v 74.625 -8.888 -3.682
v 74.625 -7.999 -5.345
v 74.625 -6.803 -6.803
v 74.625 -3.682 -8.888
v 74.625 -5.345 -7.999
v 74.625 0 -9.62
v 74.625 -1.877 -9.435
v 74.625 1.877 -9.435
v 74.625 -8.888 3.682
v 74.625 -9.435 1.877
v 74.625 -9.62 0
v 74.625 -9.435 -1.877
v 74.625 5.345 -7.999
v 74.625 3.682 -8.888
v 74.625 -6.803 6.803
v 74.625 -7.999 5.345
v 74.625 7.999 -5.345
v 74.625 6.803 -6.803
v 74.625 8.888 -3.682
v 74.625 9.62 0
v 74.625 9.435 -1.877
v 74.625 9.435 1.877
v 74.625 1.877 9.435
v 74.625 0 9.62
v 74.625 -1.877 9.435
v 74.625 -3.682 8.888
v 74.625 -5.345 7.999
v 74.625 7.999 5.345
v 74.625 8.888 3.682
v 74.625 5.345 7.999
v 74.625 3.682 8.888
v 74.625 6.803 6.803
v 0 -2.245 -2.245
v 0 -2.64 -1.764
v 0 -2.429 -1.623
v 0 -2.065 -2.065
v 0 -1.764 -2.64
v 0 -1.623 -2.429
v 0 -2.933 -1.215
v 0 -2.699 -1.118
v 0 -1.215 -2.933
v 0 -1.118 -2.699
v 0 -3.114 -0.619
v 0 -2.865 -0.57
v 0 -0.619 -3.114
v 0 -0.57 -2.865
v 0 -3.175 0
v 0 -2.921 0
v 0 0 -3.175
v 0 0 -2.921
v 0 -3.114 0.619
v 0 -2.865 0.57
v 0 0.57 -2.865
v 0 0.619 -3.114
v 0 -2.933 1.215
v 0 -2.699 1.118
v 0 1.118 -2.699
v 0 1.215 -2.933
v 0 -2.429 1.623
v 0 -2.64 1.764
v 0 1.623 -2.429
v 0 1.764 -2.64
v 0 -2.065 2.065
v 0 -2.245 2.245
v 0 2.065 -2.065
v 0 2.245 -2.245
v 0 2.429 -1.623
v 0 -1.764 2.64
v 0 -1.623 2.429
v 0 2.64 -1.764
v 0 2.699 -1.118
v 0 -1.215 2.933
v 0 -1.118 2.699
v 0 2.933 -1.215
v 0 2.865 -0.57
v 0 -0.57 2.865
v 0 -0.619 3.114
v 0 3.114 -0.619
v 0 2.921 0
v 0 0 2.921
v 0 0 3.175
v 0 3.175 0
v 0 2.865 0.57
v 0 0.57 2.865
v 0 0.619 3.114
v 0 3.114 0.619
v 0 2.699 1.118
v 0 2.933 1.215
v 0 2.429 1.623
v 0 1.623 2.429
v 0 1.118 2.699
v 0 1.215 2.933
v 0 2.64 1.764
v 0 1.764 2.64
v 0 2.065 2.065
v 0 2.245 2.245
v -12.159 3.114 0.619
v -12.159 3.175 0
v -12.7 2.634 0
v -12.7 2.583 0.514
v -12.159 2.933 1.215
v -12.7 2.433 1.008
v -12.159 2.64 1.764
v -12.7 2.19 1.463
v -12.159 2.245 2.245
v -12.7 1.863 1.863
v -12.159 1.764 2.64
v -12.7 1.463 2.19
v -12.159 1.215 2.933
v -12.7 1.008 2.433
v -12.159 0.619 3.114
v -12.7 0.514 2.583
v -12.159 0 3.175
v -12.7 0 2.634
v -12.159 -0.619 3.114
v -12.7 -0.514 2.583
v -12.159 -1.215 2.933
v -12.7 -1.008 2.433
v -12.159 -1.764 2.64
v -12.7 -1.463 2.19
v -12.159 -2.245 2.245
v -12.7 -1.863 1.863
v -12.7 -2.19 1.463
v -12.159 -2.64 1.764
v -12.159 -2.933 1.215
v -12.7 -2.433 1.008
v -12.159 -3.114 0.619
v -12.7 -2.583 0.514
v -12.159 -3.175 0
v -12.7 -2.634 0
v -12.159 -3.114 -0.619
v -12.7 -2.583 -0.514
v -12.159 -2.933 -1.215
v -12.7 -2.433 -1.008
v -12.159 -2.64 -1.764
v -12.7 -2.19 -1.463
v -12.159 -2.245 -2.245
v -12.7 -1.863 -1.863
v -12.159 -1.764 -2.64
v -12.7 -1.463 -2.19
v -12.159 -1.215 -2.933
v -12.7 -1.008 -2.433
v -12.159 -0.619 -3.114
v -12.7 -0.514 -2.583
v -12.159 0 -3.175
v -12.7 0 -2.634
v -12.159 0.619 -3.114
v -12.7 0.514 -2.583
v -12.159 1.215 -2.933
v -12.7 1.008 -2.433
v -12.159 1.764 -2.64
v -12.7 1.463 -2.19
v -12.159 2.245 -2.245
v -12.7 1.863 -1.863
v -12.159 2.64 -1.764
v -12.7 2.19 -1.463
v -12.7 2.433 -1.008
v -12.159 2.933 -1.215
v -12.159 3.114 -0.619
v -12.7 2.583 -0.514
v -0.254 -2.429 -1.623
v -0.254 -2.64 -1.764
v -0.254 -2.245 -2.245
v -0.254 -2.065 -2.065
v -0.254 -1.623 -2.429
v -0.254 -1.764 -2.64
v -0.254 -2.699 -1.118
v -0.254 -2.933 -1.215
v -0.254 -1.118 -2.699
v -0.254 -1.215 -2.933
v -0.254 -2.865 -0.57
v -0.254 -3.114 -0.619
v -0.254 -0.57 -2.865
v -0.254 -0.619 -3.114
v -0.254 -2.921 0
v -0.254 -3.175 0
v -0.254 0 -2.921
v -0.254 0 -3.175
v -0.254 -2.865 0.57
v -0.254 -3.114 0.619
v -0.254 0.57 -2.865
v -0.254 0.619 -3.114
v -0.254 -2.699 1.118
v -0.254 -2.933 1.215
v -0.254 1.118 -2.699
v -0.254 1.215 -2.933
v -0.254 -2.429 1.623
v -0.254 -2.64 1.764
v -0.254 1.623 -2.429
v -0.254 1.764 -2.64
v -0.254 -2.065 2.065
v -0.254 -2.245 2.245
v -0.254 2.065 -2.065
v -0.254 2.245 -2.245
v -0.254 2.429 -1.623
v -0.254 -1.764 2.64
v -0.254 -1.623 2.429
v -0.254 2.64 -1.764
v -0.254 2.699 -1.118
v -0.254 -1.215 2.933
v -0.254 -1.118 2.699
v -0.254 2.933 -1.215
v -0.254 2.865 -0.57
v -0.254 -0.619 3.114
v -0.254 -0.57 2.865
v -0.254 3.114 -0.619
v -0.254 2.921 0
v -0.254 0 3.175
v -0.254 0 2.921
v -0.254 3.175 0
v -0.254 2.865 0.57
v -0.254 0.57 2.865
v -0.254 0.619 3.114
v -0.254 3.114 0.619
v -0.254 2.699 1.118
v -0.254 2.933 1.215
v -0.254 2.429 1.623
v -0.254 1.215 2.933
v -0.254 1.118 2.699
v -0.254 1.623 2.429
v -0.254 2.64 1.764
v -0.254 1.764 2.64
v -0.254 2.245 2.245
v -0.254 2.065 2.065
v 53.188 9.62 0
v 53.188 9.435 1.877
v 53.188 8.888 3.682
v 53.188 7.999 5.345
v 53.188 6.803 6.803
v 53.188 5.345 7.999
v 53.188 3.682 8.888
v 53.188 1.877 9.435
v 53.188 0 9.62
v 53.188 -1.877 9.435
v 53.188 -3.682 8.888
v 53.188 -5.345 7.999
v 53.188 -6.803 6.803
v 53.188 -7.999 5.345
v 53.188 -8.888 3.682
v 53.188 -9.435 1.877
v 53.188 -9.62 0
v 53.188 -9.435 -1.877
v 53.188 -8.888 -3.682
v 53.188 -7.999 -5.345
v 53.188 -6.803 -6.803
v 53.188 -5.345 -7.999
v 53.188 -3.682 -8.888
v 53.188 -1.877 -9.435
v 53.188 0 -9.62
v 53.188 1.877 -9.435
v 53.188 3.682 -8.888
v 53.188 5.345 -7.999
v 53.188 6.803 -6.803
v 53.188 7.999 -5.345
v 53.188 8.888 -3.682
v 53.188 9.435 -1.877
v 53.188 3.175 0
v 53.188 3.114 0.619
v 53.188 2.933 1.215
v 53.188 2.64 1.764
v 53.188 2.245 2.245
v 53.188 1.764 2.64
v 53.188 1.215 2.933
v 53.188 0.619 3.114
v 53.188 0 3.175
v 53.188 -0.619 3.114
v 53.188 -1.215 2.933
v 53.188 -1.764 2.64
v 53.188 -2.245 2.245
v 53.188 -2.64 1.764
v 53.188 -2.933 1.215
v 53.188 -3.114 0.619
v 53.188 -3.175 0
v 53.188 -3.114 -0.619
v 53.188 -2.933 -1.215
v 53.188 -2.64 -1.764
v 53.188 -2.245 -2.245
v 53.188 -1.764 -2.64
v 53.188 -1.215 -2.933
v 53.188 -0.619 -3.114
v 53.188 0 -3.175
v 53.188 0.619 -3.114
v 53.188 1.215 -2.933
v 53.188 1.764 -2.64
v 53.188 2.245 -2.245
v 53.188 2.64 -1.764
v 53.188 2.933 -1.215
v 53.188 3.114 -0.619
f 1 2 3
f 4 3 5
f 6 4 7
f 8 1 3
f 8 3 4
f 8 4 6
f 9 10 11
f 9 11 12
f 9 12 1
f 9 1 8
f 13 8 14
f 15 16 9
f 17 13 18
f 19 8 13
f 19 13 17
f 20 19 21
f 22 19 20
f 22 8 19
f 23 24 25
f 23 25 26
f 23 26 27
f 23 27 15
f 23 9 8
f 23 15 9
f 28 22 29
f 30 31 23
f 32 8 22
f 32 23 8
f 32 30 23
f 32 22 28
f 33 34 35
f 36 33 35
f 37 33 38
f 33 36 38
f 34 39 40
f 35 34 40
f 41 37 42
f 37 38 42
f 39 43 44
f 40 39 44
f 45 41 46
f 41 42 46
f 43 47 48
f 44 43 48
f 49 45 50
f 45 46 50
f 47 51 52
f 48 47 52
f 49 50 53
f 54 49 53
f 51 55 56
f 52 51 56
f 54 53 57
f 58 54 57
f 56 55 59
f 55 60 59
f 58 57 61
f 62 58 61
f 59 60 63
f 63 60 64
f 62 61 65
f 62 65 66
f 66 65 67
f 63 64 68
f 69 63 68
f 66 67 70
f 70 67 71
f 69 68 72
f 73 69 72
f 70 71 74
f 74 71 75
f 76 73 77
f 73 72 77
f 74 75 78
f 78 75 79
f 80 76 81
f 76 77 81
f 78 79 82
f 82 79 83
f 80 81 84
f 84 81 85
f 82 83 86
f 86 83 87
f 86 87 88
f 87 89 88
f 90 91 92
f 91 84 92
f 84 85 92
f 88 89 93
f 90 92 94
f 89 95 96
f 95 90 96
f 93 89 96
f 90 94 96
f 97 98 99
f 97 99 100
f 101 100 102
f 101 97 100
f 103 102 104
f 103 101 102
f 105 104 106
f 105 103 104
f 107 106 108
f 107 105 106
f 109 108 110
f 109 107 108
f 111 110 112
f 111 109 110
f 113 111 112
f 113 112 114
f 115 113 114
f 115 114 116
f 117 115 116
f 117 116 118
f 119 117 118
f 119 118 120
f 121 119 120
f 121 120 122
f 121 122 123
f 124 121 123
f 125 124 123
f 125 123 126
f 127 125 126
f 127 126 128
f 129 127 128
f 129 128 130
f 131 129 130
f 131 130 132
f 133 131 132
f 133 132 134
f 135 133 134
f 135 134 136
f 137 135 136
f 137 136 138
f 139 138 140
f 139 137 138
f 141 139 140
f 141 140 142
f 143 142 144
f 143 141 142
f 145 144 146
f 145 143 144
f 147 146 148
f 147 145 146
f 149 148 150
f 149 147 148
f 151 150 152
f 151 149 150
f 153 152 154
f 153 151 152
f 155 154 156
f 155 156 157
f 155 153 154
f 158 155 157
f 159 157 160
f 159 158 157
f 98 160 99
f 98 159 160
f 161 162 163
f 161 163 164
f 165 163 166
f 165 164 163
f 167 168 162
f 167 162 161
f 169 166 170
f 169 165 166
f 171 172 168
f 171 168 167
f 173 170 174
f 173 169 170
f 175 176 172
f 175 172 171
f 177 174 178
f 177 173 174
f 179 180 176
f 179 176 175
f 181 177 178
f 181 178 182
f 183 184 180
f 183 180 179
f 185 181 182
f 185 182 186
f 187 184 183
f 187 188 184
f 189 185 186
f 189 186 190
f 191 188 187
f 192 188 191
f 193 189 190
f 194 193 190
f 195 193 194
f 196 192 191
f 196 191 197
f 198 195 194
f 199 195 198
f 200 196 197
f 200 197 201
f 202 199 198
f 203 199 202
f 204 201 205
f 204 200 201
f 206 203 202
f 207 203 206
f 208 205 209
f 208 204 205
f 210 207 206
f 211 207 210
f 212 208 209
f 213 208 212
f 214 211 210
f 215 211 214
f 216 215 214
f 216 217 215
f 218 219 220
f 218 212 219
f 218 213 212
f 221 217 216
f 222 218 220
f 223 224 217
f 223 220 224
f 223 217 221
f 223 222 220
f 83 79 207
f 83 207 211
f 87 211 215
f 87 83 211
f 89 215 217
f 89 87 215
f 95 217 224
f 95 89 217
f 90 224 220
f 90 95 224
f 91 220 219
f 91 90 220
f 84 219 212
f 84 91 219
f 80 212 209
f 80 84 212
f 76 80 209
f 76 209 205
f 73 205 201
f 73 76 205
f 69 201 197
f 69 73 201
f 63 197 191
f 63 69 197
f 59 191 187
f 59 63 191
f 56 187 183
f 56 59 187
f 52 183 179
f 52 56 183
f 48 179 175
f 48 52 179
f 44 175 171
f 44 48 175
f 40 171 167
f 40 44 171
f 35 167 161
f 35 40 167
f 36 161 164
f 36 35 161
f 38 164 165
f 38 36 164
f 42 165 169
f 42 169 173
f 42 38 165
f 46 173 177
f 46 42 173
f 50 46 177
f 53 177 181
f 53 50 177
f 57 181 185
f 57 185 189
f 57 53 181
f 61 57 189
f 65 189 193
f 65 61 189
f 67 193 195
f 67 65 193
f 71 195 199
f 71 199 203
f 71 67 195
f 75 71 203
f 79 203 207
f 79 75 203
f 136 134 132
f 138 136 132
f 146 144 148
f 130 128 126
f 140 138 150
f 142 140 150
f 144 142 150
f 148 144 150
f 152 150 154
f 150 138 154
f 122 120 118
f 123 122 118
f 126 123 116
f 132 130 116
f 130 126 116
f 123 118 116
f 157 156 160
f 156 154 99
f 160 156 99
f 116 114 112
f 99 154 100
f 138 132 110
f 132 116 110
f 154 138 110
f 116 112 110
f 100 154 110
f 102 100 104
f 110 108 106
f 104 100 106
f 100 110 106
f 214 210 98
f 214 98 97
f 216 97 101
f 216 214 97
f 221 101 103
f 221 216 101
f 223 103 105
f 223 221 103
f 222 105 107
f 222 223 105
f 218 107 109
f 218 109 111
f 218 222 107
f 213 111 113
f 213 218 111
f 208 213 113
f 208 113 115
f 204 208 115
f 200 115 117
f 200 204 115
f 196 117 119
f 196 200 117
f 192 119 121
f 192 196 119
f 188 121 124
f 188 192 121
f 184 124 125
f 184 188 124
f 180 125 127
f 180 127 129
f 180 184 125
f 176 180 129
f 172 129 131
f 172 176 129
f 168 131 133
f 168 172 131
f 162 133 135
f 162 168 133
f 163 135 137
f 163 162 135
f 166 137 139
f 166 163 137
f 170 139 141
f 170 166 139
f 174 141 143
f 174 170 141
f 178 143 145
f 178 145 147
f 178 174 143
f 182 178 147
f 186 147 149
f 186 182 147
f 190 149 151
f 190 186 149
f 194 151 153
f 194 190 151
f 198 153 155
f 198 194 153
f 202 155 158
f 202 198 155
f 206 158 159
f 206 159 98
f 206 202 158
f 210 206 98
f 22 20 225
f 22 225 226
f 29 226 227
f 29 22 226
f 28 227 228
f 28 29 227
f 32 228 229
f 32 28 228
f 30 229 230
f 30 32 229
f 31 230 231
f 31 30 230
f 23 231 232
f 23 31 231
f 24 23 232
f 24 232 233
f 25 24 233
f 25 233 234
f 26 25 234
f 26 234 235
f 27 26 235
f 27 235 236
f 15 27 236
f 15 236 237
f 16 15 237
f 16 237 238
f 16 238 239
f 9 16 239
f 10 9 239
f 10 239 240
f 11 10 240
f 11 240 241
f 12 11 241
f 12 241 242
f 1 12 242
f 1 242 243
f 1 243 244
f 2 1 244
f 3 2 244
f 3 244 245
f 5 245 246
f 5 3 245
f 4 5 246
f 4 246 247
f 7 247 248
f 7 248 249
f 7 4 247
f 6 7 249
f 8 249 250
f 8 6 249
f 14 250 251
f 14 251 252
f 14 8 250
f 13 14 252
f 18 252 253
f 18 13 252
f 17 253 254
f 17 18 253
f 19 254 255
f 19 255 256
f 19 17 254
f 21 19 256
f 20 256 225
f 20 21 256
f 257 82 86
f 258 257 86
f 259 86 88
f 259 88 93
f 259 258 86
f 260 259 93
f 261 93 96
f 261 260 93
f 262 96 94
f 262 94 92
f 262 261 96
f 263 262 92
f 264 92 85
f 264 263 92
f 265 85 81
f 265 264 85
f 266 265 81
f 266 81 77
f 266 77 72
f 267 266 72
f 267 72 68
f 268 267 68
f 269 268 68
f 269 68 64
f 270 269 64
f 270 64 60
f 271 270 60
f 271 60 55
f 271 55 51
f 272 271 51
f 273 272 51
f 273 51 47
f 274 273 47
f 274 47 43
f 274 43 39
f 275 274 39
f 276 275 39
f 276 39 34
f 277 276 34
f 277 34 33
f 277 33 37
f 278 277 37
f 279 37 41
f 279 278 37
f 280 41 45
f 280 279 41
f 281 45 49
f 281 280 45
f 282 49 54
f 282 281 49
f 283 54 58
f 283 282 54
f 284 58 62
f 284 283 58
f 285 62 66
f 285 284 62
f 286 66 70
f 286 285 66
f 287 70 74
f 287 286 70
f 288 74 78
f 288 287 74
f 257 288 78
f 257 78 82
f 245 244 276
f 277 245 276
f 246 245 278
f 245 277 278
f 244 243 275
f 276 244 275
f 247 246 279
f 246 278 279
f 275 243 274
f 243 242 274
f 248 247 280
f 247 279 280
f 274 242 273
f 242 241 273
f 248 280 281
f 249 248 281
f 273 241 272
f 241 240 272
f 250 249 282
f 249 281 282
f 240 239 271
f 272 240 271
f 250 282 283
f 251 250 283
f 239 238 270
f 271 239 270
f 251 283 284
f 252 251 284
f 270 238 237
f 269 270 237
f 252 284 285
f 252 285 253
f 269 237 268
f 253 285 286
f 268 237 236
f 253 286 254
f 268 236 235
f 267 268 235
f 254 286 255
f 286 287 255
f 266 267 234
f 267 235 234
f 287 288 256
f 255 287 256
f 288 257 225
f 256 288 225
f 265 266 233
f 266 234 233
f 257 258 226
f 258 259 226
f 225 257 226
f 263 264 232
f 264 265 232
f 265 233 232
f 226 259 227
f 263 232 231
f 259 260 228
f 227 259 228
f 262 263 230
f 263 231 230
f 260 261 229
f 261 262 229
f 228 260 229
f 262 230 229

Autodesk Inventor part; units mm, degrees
sketch "Sketch_1" plane through (0, 0, 0) normal (0, 0, 1) x (1, 0, 0)
  line L0 (74.6252, 0) -> (0, 0)
  line L1 (0, 0) -> (0, 3.175)
  line L2 (0, 3.175) -> (53.1876, 3.175)
  line L3 (53.1876, 3.175) -> (53.1876, 9.6203)
  line L4 (53.1876, 9.6203) -> (74.6252, 9.6203)
  line L5 (74.6252, 9.6203) -> (74.6252, 0)
  line L6 (74.6252, 0) -> (0, 0)
revolve "Revolution1" add sketch "Sketch_1" angle 360 about axis through (74.6252, 0, 0) along (1, 0, 0)
sketch "Sketch_3" plane through (0, 0, 0) normal (0, 0, 1) x (1, 0, 0)
  line L0 (0, 0) -> (-12.7, 0)
  line L1 (-12.7, 0) -> (-12.7, 2.634)
  line L2 (-12.7, 2.634) -> (-12.159, 3.175)
  line L3 (-12.159, 3.175) -> (0, 3.175)
  line L4 (0, 3.175) -> (0, 0)
  line L5 (0, 0) -> (-12.7, 0)
revolve "Revolution2" add sketch "Sketch_3" angle 360 about axis through (0, 0, 0) along (1, 0, 0)
sketch "Sketch_30" plane through (0, 0, 0) normal (0, 0, 1) x (1, 0, 0)
  line L0 (0, 0) -> (-0.254, 0)
  line L1 (-0.254, 3.429) -> (-0.254, 2.921)
  line L2 (-0.254, 2.921) -> (0, 2.921)
  line L3 (0, 2.921) -> (0, 3.429)
  line L4 (0, 3.429) -> (-0.254, 3.429)
revolve "Revolution3" cut sketch "Sketch_30" angle 360 about axis through (0, 0, 0) along (1, 0, 0)
ref_plane "dia1_XY" through (0, 3.175, 0) normal (1, 0, 0) x (0, 0, -1)
ref_plane "dia1_YZ" through (0, 3.175, 0) normal (0, 0, -1) x (0, 1, 0)
ref_plane "dia1_ZX" through (0, 3.175, 0) normal (0, 1, 0) x (1, 0, 0)
ref_plane "dia12_XY" through (0, 0, 10.9537) normal (1, 0, 0) x (0, 0, -1)
ref_plane "dia12_YZ" through (0, 0, 10.9537) normal (0, 0, -1) x (0, 1, 0)
ref_plane "dia12_ZX" through (0, 0, 10.9537) normal (0, 1, 0) x (1, 0, 0)
ref_plane "dia2_XY" through (0, -3.175, 0) normal (1, 0, 0) x (0, 0, -1)
ref_plane "dia2_YZ" through (0, -3.175, 0) normal (0, 0, -1) x (0, 1, 0)
ref_plane "dia2_ZX" through (0, -3.175, 0) normal (0, 1, 0) x (1, 0, 0)
ref_plane "dia22_XY" through (0, 0, -10.9537) normal (1, 0, 0) x (0, 0, -1)
ref_plane "dia22_YZ" through (0, 0, -10.9537) normal (0, 0, -1) x (0, 1, 0)
ref_plane "dia22_ZX" through (0, 0, -10.9537) normal (0, 1, 0) x (1, 0, 0)
ref_plane "rl1_XY" through (-12.7, 0, 0) normal (1, 0, 0) x (0, 0, -1)
ref_plane "rl1_YZ" through (-12.7, 0, 0) normal (0, 0, -1) x (0, 1, 0)
ref_plane "rl1_ZX" through (-12.7, 0, 0) normal (0, 1, 0) x (1, 0, 0)
ref_plane "rl2_XY" through (0, 0, 0) normal (1, 0, 0) x (0, 0, -1)
ref_plane "rl2_YZ" through (0, 0, 0) normal (0, 0, -1) x (0, 1, 0)
ref_plane "rl2_ZX" through (0, 0, 0) normal (0, 1, 0) x (1, 0, 0)
ref_plane "rod_cp_XY" through (0, 0, 0) normal (1, 0, 0) x (0, 0, -1)
ref_plane "rod_cp_YZ" through (0, 0, 0) normal (0, 0, -1) x (0, 1, 0)
ref_plane "rod_cp_ZX" through (0, 0, 0) normal (0, 1, 0) x (1, 0, 0)
ref_plane "thd1_XY" through (-12.7, 3.175, 0) normal (1, 0, 0) x (0, 0, -1)
ref_plane "thd1_YZ" through (-12.7, 3.175, 0) normal (0, 0, -1) x (0, 1, 0)
ref_plane "thd1_ZX" through (-12.7, 3.175, 0) normal (0, 1, 0) x (1, 0, 0)
ref_plane "thd2_XY" through (-12.7, -3.175, 0) normal (1, 0, 0) x (0, 0, -1)
ref_plane "thd2_YZ" through (-12.7, -3.175, 0) normal (0, 0, -1) x (0, 1, 0)
ref_plane "thd2_ZX" through (-12.7, -3.175, 0) normal (0, 1, 0) x (1, 0, 0)
ref_plane "to_rod_clevis_XY" through (-16.764, 0, 0) normal (1, 0, 0) x (0, 0, -1)
ref_plane "to_rod_clevis_YZ" through (-16.764, 0, 0) normal (0, 0, -1) x (0, 1, 0)
ref_plane "to_rod_clevis_ZX" through (-16.764, 0, 0) normal (0, 1, 0) x (1, 0, 0)
properties part number "C-040.5-DP0_rod"
